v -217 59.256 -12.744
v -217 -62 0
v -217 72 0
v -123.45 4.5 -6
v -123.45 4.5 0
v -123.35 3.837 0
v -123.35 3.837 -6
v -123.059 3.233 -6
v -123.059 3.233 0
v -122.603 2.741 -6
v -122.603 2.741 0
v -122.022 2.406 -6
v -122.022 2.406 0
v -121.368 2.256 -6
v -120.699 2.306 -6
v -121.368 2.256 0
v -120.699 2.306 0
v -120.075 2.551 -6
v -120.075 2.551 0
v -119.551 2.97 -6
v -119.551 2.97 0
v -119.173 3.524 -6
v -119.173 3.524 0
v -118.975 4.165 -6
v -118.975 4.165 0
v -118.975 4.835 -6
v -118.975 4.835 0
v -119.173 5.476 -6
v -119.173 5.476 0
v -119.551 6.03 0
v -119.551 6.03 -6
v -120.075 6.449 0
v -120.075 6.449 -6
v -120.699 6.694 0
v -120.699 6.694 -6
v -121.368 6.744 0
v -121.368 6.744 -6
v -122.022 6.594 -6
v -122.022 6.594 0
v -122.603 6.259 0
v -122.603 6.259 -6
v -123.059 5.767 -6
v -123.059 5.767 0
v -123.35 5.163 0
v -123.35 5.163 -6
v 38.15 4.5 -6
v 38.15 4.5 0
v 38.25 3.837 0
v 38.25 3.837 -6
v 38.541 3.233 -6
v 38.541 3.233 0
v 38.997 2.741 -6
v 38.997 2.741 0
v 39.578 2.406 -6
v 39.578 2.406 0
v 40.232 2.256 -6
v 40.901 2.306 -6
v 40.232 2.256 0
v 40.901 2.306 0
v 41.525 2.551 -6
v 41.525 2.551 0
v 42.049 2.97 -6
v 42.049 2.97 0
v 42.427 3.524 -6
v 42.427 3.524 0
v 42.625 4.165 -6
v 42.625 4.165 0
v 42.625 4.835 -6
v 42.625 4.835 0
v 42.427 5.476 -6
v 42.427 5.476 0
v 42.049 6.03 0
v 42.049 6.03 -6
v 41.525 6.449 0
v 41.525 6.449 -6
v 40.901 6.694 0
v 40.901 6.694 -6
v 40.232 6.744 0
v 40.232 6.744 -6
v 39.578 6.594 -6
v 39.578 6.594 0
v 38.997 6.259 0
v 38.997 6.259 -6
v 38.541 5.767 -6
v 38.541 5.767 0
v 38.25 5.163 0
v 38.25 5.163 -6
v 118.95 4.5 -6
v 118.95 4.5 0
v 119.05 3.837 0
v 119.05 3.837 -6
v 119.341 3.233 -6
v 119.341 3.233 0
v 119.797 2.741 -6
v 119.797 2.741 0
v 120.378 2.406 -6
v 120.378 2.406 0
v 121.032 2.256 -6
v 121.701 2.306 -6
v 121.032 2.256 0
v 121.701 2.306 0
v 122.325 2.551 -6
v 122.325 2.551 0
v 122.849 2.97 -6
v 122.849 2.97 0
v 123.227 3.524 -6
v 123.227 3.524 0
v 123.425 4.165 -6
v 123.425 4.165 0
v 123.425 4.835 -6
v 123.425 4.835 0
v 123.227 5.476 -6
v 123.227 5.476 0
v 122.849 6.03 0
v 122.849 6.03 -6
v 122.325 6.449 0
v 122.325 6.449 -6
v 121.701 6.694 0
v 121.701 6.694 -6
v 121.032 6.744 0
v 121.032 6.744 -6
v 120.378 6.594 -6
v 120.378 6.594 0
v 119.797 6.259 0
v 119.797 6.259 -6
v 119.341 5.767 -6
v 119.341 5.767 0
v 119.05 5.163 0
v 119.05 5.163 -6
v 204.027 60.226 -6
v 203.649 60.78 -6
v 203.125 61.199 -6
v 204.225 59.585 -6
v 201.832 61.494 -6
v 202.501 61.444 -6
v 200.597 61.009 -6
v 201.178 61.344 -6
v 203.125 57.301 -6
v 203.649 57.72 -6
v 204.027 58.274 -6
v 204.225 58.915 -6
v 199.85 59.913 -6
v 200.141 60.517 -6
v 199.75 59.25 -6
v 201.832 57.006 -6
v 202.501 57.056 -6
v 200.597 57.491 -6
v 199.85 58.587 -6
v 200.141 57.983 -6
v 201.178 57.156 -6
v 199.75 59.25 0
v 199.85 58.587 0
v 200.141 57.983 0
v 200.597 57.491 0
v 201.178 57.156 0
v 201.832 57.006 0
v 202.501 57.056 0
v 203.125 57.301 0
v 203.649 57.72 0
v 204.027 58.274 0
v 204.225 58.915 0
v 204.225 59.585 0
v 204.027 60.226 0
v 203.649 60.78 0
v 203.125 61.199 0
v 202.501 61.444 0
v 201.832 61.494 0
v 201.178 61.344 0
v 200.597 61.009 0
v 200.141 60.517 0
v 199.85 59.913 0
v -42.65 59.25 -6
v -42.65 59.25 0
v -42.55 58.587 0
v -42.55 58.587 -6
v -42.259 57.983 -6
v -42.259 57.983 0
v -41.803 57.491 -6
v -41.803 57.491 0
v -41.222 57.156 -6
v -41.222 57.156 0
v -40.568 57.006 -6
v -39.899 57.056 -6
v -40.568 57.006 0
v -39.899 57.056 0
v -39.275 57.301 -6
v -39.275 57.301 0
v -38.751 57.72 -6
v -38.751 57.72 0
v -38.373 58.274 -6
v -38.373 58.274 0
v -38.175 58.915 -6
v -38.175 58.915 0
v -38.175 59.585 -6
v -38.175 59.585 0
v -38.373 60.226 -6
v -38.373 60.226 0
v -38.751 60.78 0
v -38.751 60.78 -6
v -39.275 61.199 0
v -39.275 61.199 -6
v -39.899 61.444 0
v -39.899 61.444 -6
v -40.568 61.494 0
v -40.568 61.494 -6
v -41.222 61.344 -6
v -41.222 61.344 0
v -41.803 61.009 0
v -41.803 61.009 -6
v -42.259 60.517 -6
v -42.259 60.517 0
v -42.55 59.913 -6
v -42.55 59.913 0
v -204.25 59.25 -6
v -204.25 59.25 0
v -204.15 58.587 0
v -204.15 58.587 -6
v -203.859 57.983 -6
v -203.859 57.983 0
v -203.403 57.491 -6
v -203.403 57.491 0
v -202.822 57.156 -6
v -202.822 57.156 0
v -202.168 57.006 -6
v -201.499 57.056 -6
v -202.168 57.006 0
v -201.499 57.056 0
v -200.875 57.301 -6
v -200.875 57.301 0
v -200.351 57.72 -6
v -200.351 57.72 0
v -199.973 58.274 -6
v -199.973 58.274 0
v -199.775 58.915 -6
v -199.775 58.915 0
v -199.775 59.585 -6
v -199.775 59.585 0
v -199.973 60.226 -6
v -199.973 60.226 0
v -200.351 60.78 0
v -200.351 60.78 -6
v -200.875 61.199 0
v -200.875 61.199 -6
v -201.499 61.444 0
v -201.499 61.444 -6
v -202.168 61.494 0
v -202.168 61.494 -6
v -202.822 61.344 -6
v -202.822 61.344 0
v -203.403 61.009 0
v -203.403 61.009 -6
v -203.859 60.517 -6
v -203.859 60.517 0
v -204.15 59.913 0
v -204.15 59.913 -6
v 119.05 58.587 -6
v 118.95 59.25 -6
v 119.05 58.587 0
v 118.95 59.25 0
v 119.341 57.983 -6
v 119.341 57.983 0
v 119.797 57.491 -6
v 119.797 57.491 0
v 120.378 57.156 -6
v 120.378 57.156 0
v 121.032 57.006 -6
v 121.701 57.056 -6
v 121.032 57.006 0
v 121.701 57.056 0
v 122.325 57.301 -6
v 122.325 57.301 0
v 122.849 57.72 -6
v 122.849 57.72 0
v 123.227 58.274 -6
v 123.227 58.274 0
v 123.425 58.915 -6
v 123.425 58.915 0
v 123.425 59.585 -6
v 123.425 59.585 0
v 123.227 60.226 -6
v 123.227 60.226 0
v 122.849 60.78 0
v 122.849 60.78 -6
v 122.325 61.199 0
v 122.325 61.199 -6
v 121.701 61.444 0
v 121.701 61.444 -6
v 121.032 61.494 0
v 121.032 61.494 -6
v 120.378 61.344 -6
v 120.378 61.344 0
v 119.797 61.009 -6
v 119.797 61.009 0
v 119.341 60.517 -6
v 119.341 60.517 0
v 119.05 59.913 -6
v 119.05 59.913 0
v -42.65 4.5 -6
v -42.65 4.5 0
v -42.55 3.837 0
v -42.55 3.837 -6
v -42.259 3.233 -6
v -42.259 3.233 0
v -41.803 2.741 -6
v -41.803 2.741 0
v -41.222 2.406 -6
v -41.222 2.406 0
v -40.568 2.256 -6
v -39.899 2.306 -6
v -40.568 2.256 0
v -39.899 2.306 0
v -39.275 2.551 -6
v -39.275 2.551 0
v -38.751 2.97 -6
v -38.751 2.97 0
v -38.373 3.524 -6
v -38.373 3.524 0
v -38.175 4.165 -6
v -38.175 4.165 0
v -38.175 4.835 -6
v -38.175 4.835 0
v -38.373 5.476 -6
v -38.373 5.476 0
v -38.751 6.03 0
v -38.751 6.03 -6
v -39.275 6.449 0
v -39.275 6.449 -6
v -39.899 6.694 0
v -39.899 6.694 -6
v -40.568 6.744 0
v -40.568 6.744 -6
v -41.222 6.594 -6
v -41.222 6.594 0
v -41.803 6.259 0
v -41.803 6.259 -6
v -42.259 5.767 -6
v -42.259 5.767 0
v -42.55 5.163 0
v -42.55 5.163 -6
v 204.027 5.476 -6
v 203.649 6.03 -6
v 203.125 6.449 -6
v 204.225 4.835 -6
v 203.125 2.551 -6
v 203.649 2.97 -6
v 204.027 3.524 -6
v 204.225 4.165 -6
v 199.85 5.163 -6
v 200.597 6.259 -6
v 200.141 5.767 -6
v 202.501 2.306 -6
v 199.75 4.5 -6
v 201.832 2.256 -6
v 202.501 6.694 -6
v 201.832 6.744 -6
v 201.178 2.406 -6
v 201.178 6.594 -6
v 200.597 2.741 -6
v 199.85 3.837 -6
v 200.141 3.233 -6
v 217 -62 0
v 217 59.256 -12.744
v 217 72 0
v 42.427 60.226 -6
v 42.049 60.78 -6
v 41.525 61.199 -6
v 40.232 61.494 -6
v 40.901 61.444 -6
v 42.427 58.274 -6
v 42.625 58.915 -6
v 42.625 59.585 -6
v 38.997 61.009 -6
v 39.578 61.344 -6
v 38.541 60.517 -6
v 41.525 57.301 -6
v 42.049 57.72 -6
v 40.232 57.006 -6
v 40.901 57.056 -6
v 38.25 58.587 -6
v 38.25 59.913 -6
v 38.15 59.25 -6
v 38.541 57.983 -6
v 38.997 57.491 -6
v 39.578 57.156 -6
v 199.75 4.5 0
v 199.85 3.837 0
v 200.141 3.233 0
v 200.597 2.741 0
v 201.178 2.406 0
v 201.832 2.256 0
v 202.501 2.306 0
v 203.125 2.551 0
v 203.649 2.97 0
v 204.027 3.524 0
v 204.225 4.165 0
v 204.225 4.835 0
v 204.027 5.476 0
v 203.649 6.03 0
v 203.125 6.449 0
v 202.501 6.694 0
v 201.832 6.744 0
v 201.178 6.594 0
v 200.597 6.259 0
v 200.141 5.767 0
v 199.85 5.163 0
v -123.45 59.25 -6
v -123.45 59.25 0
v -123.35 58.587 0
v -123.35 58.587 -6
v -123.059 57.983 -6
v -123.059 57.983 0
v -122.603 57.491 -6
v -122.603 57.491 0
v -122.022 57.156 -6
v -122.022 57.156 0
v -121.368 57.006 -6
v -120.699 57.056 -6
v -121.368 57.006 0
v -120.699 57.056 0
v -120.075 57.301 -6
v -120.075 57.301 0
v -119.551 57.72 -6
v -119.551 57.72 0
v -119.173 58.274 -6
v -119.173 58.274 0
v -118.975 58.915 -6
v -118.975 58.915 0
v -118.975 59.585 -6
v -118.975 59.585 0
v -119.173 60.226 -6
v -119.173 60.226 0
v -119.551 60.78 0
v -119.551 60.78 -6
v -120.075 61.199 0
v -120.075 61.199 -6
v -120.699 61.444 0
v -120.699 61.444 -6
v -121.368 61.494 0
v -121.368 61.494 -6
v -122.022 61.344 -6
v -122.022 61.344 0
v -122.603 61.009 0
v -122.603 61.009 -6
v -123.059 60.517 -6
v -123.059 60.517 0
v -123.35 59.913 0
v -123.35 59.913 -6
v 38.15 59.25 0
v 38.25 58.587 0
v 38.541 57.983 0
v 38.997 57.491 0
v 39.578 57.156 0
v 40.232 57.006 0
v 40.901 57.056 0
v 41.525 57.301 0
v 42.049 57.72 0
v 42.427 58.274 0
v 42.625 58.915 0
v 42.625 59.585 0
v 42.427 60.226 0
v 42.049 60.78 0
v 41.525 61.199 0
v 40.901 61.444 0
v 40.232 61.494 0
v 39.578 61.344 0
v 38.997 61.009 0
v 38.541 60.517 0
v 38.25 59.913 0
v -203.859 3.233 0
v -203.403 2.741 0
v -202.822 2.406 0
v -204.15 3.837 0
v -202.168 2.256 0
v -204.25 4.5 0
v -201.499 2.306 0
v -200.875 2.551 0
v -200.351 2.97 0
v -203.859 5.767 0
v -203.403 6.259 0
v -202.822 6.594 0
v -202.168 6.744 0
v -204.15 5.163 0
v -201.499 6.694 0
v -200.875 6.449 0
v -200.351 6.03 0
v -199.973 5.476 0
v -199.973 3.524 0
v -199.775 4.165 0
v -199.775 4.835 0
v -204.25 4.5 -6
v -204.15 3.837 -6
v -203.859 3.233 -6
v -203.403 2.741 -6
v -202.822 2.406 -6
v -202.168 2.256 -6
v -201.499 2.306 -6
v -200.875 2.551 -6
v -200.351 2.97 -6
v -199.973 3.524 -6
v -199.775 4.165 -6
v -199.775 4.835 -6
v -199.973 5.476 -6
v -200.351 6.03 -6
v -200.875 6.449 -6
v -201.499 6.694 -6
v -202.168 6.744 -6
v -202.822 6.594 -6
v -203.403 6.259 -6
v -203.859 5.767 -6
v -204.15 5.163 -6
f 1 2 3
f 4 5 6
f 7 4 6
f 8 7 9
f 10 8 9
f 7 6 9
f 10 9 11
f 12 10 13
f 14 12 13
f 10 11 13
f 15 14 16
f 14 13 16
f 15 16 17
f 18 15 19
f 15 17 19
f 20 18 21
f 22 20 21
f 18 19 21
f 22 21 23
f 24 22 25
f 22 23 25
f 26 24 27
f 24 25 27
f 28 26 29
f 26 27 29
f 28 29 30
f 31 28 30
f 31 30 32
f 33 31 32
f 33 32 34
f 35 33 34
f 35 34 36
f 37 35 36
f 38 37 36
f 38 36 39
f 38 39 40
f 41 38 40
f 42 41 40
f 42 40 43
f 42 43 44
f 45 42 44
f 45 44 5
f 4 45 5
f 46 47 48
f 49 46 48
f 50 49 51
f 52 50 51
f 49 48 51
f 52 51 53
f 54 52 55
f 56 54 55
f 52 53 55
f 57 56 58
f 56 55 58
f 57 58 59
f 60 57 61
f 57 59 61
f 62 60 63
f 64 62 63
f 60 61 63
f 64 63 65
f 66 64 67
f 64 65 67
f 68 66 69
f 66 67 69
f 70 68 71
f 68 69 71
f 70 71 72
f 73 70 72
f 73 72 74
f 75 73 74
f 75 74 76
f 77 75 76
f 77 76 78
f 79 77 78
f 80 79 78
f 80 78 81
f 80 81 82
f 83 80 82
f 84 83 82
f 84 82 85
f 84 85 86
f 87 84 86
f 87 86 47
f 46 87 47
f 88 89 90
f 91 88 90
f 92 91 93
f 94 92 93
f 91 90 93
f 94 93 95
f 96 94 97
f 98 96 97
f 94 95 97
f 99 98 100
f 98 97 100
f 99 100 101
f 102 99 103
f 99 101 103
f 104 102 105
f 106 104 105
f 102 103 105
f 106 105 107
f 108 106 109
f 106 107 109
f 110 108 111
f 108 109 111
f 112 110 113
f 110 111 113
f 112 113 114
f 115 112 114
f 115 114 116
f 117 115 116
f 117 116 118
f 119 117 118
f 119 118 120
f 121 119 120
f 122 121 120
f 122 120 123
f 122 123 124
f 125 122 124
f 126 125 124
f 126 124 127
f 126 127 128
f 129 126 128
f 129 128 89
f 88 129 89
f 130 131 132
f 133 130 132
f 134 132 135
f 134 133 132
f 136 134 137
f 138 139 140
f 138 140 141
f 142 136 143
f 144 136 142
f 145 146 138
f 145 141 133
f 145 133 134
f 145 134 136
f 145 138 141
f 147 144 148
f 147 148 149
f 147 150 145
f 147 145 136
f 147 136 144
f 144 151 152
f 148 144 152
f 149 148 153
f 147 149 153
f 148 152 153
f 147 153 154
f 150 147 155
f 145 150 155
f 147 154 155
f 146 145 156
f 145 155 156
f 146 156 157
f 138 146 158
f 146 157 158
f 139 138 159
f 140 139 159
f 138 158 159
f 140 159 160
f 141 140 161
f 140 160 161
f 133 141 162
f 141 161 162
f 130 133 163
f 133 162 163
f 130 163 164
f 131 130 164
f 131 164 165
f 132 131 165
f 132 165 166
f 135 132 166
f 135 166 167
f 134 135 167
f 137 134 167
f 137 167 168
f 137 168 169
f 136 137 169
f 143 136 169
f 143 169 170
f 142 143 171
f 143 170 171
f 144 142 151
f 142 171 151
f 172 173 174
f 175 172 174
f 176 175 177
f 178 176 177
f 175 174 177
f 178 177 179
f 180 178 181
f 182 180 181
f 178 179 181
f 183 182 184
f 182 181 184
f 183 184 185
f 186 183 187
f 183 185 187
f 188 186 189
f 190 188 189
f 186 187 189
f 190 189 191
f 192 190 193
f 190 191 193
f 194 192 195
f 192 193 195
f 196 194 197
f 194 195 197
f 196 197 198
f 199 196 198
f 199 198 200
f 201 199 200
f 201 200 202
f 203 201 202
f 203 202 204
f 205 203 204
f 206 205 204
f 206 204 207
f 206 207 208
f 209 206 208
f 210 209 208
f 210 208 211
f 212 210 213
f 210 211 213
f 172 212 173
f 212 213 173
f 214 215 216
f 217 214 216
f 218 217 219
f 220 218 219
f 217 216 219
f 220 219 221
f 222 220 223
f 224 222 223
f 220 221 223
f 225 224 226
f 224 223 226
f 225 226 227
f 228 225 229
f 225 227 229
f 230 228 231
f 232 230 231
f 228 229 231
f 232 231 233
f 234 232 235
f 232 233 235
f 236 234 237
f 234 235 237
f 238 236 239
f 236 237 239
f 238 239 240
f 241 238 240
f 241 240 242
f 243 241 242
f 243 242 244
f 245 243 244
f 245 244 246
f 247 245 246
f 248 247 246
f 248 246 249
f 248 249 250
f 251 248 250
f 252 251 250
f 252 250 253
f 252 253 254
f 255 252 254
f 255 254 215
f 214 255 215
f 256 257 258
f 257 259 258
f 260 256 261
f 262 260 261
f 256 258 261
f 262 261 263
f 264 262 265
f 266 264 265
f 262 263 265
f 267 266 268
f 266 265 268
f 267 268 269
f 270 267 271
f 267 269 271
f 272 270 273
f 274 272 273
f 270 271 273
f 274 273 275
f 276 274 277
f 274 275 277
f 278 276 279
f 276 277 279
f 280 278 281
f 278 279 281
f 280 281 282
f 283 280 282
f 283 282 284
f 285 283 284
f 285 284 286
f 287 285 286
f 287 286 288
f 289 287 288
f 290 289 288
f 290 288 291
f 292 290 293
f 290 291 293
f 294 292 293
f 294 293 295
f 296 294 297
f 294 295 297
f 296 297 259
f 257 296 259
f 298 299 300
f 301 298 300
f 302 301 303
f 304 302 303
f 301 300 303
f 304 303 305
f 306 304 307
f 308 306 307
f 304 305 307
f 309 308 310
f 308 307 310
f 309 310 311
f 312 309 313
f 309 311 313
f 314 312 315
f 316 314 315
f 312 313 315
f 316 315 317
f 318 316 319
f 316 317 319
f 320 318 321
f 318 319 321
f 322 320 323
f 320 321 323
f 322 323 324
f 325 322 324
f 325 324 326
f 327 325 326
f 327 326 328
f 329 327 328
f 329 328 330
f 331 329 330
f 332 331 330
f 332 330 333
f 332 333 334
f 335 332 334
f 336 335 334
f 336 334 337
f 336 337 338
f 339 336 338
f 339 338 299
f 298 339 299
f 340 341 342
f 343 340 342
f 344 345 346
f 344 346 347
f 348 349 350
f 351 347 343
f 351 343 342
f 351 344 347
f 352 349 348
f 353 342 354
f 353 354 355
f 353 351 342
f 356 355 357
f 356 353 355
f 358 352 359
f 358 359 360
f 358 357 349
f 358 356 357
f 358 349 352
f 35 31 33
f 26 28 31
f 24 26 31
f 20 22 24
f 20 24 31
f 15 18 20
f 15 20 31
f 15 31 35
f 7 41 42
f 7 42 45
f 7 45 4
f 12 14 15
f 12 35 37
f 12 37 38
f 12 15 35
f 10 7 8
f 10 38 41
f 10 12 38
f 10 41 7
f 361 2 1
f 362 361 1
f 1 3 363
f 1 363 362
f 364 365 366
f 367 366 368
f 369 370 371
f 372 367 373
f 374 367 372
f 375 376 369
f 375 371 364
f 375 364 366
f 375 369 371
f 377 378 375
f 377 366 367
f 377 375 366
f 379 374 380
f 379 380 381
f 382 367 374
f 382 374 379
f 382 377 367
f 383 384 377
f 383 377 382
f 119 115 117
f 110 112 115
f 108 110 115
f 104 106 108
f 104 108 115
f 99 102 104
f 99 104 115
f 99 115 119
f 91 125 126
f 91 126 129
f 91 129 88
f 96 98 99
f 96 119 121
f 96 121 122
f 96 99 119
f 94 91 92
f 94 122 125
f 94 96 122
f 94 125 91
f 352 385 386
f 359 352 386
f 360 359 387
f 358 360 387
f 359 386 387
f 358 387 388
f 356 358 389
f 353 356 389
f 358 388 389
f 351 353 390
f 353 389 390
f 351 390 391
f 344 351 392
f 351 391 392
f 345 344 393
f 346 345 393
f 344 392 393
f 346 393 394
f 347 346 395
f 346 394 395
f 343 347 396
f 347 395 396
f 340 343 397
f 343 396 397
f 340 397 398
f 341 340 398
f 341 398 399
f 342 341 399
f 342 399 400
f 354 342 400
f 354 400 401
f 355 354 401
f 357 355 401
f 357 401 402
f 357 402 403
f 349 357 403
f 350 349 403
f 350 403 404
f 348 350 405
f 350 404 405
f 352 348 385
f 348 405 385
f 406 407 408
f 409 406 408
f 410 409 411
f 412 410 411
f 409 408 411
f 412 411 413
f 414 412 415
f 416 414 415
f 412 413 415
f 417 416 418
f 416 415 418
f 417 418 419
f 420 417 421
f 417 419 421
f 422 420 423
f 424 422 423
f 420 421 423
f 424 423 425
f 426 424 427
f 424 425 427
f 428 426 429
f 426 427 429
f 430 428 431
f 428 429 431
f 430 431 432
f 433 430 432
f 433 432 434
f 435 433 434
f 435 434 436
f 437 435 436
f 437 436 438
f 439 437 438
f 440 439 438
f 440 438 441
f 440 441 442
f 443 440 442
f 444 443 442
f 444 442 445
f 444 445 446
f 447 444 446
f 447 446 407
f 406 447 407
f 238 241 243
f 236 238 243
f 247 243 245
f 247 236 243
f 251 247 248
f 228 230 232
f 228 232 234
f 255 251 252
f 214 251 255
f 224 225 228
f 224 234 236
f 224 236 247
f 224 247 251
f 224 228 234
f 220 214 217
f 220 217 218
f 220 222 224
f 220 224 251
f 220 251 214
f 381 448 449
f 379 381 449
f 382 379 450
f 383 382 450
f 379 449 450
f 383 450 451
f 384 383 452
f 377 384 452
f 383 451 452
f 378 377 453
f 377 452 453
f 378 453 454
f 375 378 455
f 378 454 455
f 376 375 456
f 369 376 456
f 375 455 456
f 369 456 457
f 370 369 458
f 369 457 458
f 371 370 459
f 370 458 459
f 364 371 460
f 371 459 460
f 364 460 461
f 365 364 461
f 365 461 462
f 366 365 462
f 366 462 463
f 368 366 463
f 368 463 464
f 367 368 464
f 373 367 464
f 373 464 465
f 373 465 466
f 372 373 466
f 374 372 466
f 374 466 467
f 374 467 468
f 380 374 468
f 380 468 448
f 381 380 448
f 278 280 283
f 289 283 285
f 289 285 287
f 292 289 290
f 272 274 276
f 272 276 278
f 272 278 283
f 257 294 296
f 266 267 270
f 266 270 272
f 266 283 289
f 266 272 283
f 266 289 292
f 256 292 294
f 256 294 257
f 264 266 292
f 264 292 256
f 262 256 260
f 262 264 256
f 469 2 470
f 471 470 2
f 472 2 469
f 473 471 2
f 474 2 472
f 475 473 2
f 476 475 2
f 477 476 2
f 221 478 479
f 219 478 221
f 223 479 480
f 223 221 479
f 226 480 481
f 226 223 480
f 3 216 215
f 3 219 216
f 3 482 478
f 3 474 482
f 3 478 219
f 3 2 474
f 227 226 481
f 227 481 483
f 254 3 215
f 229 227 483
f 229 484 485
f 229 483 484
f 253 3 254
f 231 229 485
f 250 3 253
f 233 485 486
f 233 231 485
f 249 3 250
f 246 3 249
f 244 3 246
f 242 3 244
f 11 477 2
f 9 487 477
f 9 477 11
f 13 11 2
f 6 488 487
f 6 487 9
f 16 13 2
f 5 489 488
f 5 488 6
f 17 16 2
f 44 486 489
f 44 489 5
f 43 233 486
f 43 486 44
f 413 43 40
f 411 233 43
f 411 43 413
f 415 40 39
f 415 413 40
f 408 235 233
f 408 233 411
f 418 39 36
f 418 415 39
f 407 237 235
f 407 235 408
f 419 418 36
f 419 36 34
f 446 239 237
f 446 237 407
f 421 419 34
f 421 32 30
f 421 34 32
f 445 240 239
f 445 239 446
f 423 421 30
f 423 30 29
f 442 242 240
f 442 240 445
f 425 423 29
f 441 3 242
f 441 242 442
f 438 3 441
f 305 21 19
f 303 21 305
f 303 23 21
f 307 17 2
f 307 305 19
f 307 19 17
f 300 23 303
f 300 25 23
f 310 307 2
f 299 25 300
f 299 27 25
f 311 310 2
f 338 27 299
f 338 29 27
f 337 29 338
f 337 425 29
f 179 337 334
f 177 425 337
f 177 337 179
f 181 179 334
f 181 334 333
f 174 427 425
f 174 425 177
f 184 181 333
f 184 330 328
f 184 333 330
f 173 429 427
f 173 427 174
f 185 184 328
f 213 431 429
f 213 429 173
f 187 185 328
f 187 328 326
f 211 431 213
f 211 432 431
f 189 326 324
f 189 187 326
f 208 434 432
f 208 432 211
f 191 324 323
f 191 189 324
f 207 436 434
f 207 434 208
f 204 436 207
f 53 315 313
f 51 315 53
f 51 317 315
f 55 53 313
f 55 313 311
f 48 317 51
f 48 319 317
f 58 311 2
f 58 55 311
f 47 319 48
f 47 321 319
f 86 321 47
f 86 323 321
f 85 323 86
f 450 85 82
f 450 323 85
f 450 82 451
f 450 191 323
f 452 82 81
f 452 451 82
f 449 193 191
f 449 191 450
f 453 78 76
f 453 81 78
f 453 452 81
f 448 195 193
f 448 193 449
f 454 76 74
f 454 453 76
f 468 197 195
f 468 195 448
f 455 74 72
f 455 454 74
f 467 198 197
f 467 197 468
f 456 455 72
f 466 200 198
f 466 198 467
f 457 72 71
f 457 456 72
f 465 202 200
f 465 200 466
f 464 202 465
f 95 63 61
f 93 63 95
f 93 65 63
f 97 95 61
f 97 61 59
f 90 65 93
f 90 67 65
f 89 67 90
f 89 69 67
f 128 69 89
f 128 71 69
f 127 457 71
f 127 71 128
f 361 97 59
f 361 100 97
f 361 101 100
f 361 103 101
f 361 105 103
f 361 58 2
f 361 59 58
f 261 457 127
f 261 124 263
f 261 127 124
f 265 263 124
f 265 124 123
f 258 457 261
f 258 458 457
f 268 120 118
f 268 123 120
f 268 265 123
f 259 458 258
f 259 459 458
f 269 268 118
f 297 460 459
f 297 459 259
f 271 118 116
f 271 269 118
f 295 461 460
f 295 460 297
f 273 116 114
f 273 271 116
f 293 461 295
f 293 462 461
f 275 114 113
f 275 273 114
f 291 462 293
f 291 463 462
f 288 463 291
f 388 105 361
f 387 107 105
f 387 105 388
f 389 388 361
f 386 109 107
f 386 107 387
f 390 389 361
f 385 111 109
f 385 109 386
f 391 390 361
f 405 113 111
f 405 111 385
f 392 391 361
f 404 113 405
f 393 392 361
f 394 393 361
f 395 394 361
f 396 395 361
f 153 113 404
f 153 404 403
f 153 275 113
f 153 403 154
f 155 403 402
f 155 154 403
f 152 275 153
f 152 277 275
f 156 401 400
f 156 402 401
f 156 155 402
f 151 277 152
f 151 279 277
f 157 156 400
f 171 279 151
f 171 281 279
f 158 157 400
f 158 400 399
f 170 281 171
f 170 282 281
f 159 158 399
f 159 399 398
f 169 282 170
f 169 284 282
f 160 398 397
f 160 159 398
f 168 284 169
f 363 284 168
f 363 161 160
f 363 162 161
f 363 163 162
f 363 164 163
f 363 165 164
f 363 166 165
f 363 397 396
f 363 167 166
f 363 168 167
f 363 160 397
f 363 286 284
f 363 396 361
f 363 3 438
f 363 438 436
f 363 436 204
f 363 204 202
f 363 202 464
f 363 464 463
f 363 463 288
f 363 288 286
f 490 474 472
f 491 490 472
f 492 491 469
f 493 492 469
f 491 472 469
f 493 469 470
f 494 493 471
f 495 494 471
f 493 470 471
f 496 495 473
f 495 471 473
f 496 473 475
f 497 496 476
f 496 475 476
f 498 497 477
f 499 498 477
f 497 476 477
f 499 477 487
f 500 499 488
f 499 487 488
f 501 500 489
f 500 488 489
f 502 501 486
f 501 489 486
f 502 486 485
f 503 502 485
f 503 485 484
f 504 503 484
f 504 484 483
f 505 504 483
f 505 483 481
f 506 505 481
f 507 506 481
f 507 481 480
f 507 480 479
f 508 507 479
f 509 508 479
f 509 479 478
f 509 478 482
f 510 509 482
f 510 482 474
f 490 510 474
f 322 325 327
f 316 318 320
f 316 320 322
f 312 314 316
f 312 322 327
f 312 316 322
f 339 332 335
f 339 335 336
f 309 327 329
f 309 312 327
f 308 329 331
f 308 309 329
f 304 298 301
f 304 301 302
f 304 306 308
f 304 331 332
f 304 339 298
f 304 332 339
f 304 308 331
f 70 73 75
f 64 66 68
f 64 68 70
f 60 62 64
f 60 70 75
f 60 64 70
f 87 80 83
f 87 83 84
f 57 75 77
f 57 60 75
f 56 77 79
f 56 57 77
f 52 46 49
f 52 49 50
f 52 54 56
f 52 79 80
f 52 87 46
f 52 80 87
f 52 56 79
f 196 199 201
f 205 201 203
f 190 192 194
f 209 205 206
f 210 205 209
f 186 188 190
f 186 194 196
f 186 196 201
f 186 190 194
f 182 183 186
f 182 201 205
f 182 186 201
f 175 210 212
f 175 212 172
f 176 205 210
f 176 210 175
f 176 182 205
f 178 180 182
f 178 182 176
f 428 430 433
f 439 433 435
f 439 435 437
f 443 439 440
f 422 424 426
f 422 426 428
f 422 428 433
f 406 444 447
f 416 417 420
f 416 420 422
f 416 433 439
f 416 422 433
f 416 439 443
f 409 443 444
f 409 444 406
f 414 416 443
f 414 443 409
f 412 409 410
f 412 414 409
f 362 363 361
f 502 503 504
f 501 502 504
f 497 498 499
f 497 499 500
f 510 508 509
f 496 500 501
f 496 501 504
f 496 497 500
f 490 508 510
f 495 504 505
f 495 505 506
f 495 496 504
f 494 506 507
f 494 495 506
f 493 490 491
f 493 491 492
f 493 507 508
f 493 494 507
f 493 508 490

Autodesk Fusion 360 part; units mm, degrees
sketch "Sketch1" plane through (0, 0, 0) normal (0, 0, 1) x (1, 0, 0)
  line L0 (-217, 72) -> (217, 72)
  line L1 (217, 72) -> (217, -62)
  line L2 (217, -62) -> (-217, -62)
  line L3 (-217, -62) -> (-217, 72)
extrude "Extrude4" add sketch "Sketch1" against normal blind 230
sketch "Sketch4" plane through (-217, 0, 0) normal (-1, 0, 0) x (0, -1, 0)
  line L0 (62, 0) -> (-72, 0)
  line L1 (-72, 0) -> (-72, -230)
  line L2 (-72, -230) -> (62, -230)
  line L3 (62, -230) -> (62, 0)
  line L4 (62, 0) -> (-29, 0) construction
  line L5 (-72, 0) -> (-59.2555, -12.7445)
  line L6 (-72, 0) -> (-53.9766, 0) construction
  line L7 (62, 0) -> (-59.2555, -12.7445)
  line L8 (62, 0) -> (-59.9234, 0) construction
  dimension "d30" = 45
  dimension "d31" = 6
extrude "Extrude5" cut sketch "Sketch4" against normal blind 520 contours L1 L2 L3 L5 L7
sketch "Sketch5" plane through (0, 0, 0) normal (0, 0, 1) x (-1, 0, 0)
  line L0 (217, 62) -> (-217, 62)
  line L1 (-217, 62) -> (-217, -72)
  line L2 (-217, -72) -> (217, -72)
  line L3 (217, -72) -> (217, 62)
  circle A0 centre (202, -59.25) radius 2.25
  circle A1 centre (121.2, -59.25) radius 2.25
  circle A2 centre (40.4, -59.25) radius 2.25
  circle A3 centre (-40.4, -59.25) radius 2.25
  circle A4 centre (-121.2, -59.25) radius 2.25
  circle A5 centre (-202, -59.25) radius 2.25
  circle A6 centre (202, -4.5) radius 2.25
  circle A7 centre (121.2, -4.5) radius 2.25
  circle A8 centre (40.4, -4.5) radius 2.25
  circle A9 centre (-40.4, -4.5) radius 2.25
  circle A10 centre (-121.2, -4.5) radius 2.25
  circle A11 centre (-202, -4.5) radius 2.25
  dimension "d34" = 4.5
  dimension "d35" = 12.75
  dimension "d36" = 15
  dimension "d39" = -404
  dimension "d40" = 0
  dimension "d41" = 4.5
  dimension "d42" = 66.5
  dimension "d43" = 15
  dimension "d46" = -404
  dimension "d47" = 0
extrude "Extrude6" cut sketch "Sketch5" against normal blind 6 contours A0 | A1 | A2 | A3 | A4 | A5 | A6 | A7 | A8 | A9 | A10 | A11
